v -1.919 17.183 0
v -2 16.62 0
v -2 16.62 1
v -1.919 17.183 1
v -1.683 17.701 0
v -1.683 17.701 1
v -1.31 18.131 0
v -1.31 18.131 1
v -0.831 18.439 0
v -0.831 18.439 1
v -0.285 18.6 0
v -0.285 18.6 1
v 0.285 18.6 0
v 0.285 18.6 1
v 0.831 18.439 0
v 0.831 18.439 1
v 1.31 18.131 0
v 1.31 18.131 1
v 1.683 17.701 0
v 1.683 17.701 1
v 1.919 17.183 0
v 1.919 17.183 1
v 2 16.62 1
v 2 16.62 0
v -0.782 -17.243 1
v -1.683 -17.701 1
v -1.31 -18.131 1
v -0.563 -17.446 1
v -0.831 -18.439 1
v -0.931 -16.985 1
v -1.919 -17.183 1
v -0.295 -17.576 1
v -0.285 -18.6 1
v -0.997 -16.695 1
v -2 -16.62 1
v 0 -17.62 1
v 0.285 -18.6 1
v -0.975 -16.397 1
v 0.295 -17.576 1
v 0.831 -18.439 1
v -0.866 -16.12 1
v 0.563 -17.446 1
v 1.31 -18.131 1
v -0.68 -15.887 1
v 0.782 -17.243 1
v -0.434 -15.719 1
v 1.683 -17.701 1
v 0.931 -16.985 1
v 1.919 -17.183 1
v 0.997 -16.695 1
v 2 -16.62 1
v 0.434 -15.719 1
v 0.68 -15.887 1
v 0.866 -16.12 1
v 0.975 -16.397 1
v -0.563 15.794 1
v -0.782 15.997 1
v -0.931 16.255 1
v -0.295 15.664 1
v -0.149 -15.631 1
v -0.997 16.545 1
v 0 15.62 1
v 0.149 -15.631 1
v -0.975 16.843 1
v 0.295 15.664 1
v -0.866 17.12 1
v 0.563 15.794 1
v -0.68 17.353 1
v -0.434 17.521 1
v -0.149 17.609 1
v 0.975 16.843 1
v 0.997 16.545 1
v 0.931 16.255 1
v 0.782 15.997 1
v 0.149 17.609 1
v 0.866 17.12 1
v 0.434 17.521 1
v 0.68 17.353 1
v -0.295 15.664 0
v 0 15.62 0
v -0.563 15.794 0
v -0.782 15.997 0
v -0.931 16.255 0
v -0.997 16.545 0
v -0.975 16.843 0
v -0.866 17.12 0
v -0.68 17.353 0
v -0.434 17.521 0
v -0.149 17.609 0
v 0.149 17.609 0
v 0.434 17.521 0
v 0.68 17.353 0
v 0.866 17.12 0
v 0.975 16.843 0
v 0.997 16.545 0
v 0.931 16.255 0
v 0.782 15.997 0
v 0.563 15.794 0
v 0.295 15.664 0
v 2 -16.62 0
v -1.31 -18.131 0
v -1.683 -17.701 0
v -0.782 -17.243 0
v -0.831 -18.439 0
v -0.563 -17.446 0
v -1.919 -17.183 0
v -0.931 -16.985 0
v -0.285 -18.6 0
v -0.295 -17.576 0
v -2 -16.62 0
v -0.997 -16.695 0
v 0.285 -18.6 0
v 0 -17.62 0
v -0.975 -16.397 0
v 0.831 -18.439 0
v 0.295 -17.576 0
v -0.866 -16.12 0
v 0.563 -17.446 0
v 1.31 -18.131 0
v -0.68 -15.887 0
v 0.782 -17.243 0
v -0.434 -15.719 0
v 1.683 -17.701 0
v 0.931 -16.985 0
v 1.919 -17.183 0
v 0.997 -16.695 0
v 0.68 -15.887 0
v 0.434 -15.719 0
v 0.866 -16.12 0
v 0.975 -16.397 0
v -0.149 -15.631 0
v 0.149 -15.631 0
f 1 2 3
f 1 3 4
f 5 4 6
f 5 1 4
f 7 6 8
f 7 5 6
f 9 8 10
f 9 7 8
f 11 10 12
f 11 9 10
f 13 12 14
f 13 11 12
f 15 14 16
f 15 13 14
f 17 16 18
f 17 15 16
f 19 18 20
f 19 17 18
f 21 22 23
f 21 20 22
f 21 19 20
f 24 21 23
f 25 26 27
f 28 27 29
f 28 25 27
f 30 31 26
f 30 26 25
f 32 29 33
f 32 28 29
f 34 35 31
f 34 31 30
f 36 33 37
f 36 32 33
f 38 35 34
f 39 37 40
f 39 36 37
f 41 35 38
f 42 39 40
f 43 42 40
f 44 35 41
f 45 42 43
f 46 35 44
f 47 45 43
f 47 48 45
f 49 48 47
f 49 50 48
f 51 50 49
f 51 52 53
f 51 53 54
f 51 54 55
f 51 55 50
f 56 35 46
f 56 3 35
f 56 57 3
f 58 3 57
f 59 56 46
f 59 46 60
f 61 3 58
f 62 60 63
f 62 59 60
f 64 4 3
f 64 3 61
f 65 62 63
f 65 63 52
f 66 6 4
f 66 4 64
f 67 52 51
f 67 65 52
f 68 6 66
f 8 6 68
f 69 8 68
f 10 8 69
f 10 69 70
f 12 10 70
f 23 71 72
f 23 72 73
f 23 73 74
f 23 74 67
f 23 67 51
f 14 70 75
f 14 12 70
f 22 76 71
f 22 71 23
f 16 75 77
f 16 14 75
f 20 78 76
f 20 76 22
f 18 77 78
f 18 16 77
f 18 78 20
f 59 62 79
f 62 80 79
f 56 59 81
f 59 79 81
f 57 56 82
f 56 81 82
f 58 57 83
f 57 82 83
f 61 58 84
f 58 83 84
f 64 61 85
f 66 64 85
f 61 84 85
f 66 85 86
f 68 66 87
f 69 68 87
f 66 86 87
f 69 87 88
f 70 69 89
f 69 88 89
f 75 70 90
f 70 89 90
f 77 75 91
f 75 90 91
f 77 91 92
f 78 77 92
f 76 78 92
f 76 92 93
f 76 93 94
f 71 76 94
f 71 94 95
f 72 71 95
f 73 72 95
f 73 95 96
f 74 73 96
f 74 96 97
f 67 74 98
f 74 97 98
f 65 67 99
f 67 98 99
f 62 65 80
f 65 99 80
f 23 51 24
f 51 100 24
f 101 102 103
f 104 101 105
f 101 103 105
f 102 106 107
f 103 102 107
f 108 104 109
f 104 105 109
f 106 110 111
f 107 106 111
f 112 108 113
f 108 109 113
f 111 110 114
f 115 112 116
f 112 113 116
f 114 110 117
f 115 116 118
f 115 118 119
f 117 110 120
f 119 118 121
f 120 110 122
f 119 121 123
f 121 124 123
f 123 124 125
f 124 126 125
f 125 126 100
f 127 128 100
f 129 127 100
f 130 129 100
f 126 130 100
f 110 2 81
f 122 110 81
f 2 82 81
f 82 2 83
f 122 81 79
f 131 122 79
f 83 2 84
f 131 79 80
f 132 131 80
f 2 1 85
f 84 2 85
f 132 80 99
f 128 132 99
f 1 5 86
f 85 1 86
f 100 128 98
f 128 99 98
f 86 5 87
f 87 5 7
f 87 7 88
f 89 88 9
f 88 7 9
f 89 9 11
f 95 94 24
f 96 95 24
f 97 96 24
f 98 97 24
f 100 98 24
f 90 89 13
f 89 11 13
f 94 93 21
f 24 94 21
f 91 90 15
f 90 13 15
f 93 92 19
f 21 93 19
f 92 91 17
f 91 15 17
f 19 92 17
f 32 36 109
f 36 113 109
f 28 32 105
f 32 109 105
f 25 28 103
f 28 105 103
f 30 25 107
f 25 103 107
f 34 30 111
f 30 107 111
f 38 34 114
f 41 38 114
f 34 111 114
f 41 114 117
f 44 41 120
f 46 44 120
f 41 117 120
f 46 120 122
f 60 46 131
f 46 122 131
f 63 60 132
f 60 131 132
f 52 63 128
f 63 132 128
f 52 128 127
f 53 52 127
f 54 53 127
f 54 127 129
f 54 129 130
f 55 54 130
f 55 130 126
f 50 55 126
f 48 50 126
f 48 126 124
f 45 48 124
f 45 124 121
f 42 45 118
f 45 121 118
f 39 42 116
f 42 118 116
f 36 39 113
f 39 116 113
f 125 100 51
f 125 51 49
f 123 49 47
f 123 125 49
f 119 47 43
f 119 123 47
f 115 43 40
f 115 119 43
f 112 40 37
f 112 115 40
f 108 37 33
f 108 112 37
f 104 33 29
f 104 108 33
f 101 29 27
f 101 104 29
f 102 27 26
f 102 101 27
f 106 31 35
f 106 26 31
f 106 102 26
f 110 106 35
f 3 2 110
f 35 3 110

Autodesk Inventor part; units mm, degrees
ref_plane "YZ Plane" through (0, 0, 0) normal (1, 0, 0) x (0, 1, 0)
ref_plane "XZ Plane" through (0, 0, 0) normal (0, 1, 0) x (-1, 0, 0)
ref_plane "XY Plane" through (0, 0, 0) normal (0, 0, 1) x (1, 0, 0)
sketch "草圖1" plane through (0, 0, 0) normal (0, 0, 1) x (1, 0, 0)
  line L0 (0, -16.62) -> (0, 16.62) construction
  line L1 (2, -16.62) -> (2, 16.62)
  line L2 (-2, 16.62) -> (-2, -16.62)
  arc A0 (-2, -16.62) -> (2, -16.62) centre (0, -16.62) ccw
  arc A1 (2, 16.62) -> (-2, 16.62) centre (0, 16.62) ccw
  point P0 (0, 0)
  dimension "d0" = 33.24
  dimension "d1" = 4
extrude "擠出1" add sketch "草圖1" along normal blind 1
sketch "草圖2" plane through (0, 0, 1) normal (0, 0, 1) x (1, 0, 0)
  arc A0 (2, 16.62) -> (-2, 16.62) centre (0, 16.62) ccw projected
  circle A1 centre (0, 16.62) radius 0.75
  arc A2 (-2, -16.62) -> (2, -16.62) centre (0, -16.62) ccw projected
  circle A3 centre (0, -16.62) radius 0.75
  point P0 (0, 0)
  dimension "d4" = 1.5
  dimension "d5" = 1.5
extrude "擠出2" add sketch "草圖2" along normal blind 1
hole "孔1" at (0, -16.62, 1) at (0, 16.62, 1) direction (0, 0, -1) diameter 2 end through all
hole "孔2" at (0, -16.62, 1) at (0, 16.62, 1) direction (0, 0, 1) diameter 2 end through all
properties part number "連桿4"
